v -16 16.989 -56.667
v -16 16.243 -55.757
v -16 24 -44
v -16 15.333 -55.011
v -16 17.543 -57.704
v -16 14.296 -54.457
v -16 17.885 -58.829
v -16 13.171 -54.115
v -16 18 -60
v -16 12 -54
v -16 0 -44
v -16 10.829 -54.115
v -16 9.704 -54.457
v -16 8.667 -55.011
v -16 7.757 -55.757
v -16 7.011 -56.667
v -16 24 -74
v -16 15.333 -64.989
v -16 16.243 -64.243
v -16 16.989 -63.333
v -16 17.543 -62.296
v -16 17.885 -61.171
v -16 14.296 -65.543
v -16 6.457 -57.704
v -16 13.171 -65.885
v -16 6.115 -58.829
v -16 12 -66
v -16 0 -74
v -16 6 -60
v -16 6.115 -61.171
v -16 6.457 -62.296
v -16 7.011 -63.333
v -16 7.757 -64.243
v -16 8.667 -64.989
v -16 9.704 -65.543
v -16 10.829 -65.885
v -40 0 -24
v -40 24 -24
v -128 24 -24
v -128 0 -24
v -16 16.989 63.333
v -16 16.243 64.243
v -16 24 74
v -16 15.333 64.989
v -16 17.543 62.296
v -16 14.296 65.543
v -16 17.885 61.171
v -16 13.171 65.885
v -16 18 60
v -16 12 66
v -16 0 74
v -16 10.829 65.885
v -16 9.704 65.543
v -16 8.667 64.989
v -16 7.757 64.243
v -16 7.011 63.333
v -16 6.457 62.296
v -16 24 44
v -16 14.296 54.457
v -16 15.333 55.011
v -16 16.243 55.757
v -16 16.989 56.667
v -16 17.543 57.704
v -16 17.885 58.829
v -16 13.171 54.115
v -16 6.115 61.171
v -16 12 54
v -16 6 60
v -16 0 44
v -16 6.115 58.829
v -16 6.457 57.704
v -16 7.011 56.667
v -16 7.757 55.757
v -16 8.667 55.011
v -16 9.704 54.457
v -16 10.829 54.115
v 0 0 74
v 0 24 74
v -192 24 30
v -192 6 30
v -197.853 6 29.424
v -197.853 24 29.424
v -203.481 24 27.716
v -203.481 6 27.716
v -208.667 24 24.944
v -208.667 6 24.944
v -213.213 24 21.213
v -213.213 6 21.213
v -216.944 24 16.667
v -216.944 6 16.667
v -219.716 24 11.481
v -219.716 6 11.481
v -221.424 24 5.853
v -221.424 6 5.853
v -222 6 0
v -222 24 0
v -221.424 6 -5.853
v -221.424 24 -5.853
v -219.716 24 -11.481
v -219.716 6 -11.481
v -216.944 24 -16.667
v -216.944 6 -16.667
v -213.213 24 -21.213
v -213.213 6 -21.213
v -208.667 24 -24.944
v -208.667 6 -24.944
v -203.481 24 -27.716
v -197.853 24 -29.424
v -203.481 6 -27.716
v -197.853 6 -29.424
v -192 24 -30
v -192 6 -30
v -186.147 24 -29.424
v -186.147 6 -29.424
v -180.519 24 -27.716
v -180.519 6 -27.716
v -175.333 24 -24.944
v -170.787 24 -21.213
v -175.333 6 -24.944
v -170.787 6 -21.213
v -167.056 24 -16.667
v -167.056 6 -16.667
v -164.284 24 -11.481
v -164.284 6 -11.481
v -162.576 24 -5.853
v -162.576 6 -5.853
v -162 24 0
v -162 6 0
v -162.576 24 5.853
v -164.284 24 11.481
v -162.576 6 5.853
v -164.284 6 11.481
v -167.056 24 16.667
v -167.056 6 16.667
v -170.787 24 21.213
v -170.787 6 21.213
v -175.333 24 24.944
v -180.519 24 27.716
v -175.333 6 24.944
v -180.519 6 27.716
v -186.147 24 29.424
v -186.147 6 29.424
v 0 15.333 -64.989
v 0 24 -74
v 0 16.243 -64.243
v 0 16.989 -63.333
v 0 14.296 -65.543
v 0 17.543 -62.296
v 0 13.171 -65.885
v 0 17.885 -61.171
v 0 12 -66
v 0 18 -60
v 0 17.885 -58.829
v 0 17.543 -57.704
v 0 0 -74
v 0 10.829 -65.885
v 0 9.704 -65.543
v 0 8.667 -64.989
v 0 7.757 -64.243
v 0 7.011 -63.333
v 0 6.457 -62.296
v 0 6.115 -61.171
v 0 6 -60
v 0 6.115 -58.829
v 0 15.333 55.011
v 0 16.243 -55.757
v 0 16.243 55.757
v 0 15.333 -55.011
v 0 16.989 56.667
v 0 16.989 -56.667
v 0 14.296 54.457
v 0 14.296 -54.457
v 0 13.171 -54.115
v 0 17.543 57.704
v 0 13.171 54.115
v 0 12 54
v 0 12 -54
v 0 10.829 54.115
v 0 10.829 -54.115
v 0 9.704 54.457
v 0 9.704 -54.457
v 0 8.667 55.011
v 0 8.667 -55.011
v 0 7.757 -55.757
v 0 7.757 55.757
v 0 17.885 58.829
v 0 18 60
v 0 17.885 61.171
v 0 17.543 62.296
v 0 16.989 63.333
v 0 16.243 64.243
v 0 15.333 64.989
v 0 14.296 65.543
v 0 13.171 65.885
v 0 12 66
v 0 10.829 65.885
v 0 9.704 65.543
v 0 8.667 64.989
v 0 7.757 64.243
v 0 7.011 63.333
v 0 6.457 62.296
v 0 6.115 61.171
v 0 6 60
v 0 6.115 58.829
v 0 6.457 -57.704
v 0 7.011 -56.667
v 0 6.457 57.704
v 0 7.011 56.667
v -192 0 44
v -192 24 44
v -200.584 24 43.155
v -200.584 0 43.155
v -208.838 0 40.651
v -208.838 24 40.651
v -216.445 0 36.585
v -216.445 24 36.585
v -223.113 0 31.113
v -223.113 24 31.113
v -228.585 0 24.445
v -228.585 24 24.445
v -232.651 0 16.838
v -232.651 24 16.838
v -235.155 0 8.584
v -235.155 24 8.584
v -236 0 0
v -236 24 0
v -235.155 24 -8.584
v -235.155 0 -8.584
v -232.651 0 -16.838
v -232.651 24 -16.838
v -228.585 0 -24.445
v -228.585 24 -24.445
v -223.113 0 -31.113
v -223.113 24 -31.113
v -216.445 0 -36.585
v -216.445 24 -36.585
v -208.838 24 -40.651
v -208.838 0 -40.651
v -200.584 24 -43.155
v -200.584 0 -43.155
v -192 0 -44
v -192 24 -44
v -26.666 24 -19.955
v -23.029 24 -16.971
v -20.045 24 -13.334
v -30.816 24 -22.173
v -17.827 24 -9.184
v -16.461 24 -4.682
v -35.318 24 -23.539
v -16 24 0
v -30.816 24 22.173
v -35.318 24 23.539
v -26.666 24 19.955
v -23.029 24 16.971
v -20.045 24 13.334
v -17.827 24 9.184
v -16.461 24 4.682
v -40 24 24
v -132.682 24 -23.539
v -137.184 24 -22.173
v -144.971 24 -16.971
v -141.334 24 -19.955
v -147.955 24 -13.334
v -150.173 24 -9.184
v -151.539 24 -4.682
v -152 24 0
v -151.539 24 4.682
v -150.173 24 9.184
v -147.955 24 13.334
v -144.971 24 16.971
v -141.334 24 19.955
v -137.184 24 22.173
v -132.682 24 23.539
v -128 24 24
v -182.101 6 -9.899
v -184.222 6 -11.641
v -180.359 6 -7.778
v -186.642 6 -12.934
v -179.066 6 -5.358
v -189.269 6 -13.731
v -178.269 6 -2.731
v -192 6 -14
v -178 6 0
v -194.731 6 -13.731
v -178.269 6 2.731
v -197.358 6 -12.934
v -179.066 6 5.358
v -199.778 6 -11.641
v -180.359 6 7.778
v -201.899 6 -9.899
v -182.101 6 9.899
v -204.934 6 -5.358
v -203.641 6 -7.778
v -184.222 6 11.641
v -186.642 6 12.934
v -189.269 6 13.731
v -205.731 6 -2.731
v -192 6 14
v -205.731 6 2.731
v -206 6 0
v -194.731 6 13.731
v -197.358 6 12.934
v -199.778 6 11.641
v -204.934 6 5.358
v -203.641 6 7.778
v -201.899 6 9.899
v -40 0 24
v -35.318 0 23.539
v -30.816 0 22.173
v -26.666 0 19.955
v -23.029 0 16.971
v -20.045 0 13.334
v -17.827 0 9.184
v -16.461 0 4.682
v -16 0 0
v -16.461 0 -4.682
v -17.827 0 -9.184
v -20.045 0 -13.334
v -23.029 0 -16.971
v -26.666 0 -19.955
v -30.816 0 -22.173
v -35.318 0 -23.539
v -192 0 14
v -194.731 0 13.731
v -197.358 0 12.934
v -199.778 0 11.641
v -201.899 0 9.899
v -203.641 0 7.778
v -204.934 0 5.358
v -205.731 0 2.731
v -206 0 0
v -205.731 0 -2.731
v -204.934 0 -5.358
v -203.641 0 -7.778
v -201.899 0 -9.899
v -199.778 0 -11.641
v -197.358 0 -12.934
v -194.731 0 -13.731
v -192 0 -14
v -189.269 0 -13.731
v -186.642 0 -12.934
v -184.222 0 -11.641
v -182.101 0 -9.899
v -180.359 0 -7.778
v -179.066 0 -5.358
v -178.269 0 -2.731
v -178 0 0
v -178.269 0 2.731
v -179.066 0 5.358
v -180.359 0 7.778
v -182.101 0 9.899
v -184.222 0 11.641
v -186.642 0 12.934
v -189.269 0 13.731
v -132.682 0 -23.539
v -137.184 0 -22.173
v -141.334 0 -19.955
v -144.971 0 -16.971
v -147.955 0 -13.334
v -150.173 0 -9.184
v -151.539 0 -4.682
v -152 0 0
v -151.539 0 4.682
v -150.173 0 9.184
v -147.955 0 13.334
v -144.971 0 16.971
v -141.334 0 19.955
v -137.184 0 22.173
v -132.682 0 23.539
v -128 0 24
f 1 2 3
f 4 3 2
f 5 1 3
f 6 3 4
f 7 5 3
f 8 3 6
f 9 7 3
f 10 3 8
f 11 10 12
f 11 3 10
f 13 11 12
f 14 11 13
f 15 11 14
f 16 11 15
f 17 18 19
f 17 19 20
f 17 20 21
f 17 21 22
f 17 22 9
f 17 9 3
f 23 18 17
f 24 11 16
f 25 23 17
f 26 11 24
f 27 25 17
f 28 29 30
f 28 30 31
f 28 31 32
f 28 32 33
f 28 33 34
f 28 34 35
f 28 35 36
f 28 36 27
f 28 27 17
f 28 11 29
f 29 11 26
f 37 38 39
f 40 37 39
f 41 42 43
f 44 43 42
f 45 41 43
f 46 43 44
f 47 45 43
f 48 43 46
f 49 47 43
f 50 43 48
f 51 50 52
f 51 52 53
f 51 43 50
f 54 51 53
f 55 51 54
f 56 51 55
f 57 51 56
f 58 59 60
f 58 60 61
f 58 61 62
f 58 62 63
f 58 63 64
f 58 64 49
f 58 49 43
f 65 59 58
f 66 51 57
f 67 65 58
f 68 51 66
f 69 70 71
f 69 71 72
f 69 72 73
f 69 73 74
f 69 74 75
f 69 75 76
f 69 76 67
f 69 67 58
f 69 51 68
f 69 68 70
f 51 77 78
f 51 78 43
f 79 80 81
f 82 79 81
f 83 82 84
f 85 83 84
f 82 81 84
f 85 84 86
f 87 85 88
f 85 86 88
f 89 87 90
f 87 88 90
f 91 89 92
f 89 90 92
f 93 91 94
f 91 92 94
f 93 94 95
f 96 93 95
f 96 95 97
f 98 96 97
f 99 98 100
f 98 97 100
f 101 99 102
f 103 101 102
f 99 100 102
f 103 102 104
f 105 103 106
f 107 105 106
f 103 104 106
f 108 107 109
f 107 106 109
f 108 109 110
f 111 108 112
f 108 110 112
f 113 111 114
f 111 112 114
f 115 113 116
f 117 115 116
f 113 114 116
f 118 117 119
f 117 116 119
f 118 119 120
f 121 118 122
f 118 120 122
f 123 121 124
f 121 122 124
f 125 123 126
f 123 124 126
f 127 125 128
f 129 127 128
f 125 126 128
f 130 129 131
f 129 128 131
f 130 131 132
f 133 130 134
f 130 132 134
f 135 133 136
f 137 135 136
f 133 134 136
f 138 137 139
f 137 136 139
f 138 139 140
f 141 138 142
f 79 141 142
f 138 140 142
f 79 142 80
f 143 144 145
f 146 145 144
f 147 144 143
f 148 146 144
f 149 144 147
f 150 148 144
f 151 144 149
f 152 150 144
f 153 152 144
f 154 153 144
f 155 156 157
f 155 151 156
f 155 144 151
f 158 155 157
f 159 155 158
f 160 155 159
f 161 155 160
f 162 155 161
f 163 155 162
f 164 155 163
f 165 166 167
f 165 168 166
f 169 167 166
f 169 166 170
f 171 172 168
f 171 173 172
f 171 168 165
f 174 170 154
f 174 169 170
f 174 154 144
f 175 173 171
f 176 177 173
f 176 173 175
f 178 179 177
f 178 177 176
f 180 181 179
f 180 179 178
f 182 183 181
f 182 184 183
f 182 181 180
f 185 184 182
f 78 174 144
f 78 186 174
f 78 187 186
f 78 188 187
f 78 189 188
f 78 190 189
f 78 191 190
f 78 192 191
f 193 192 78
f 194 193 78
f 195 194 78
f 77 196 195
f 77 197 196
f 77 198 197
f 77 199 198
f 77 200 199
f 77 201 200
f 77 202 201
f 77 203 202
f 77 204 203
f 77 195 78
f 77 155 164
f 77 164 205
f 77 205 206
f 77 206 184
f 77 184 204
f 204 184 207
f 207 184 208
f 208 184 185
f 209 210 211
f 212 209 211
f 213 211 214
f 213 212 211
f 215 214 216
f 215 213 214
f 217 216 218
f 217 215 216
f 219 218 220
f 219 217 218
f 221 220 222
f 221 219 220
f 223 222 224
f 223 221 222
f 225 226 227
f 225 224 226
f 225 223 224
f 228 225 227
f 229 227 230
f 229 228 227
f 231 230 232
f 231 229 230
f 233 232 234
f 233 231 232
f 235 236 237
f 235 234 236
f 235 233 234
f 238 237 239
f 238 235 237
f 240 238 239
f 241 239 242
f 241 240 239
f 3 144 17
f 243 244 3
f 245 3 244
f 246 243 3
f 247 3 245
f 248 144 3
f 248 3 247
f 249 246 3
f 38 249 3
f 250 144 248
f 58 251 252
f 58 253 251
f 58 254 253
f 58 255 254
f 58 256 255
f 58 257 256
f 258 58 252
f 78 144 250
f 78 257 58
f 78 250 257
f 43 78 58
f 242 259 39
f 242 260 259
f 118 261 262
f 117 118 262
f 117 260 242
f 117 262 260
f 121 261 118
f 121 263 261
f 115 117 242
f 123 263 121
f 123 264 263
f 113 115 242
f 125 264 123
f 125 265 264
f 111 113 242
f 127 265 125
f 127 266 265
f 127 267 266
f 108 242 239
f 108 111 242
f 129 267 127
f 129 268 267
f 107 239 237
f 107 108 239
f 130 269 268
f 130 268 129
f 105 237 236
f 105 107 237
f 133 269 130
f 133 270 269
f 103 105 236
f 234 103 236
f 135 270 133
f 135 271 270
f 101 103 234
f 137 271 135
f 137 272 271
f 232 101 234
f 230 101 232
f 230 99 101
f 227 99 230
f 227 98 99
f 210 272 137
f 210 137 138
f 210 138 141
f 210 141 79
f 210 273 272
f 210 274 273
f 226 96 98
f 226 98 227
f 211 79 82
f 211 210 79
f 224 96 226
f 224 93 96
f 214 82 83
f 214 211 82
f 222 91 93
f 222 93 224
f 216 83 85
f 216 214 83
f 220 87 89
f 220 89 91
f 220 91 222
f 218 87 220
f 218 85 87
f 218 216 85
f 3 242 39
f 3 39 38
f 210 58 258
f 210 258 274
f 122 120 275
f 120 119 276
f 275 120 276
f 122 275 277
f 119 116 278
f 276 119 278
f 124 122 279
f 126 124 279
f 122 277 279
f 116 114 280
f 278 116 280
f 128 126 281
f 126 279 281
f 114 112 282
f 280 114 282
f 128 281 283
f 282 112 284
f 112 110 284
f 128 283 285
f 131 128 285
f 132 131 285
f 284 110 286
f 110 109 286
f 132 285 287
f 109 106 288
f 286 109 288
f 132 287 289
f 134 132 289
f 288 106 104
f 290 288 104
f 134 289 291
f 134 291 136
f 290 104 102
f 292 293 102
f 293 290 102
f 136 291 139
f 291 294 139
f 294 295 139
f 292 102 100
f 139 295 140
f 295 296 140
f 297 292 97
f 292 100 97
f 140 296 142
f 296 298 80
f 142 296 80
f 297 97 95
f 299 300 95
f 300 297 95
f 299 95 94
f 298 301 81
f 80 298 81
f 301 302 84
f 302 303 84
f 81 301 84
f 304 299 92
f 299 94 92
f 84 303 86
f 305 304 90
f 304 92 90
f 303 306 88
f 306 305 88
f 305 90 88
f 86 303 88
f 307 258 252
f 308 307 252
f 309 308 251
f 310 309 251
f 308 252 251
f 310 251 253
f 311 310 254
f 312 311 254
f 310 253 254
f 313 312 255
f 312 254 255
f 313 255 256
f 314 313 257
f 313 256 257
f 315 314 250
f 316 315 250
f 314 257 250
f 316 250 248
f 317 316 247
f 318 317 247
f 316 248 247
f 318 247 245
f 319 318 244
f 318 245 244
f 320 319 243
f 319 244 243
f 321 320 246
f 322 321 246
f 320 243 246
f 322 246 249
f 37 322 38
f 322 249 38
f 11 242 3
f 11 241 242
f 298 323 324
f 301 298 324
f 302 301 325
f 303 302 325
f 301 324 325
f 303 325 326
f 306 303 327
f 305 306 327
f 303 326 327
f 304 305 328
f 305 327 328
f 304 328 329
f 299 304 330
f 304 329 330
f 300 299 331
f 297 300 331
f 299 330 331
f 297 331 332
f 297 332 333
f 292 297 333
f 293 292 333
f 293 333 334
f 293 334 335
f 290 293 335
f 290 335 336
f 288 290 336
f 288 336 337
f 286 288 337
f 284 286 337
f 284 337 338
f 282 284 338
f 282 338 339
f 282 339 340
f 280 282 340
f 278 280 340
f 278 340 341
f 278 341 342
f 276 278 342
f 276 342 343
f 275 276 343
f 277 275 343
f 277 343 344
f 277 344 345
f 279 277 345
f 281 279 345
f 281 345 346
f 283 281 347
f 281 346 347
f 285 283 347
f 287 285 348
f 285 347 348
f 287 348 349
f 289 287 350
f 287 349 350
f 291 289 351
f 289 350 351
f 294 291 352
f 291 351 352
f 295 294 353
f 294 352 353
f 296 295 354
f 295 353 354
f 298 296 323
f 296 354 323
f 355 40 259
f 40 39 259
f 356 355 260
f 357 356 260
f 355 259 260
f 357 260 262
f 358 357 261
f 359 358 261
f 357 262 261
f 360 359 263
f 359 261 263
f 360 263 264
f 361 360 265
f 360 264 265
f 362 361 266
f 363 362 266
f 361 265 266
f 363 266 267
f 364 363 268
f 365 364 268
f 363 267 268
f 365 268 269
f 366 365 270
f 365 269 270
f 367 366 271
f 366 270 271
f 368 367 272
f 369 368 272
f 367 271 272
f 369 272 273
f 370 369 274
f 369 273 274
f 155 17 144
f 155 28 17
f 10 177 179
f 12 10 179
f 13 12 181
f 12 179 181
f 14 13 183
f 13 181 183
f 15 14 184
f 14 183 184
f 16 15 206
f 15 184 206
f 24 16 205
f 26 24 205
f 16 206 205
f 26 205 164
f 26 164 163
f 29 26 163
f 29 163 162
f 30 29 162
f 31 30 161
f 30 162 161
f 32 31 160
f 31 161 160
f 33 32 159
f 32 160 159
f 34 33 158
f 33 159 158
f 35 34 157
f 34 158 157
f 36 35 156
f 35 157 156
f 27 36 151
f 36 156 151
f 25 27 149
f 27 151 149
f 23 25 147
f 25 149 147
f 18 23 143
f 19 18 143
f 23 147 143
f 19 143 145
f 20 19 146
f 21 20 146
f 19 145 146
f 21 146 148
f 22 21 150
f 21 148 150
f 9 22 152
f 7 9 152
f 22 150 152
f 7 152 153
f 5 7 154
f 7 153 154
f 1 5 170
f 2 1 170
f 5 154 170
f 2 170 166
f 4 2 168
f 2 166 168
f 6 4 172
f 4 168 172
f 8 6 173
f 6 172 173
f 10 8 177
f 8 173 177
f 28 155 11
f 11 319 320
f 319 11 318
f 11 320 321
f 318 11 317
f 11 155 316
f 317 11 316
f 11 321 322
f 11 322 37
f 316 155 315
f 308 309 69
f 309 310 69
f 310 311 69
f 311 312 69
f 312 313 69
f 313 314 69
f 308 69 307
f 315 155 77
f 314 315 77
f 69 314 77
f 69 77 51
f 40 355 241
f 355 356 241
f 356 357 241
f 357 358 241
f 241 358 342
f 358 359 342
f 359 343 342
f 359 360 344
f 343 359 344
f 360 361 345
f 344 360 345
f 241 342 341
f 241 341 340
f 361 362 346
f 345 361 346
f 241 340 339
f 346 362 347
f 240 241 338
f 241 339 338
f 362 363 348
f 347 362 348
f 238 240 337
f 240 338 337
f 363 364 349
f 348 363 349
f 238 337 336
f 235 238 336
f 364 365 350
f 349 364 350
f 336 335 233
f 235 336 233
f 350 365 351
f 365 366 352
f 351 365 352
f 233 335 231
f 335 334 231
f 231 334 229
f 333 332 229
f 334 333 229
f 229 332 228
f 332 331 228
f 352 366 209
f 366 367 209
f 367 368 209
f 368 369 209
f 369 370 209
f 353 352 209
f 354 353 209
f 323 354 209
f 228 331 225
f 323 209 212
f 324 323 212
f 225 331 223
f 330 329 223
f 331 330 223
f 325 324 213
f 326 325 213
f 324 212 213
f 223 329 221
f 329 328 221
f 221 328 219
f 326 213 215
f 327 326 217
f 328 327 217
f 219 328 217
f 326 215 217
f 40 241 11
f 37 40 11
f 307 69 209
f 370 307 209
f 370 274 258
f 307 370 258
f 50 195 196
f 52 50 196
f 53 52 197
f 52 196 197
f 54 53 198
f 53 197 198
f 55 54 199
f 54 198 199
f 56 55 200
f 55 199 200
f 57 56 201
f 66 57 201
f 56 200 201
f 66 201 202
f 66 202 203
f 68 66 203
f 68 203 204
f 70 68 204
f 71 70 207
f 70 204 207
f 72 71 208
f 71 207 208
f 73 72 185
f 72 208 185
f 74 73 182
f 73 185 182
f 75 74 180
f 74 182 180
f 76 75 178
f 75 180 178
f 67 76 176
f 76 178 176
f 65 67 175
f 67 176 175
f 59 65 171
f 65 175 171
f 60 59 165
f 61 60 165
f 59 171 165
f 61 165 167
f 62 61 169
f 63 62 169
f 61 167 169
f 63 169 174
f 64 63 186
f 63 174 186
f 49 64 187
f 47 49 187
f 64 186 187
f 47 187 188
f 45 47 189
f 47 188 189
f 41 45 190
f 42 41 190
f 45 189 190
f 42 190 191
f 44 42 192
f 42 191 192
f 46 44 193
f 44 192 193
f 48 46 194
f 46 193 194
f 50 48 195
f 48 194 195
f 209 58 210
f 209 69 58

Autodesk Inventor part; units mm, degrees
ref_plane "YZ Plane" through (0, 0, 0) normal (1, 0, 0) x (0, 1, 0)
ref_plane "XZ Plane" through (0, 0, 0) normal (0, 1, 0) x (-1, 0, 0)
ref_plane "XY Plane" through (0, 0, 0) normal (0, 0, 1) x (1, 0, 0)
sketch "Skizze1" plane through (0, 0, 0) normal (0, 1, 0) x (-1, 0, 0)
  line L0 (0, 0) -> (0, 74)
  line L1 (0, 74) -> (16, 74)
  line L2 (16, 74) -> (16, 44)
  line L3 (16, 44) -> (192, 44)
  arc A0 (192, -44) -> (192, 44) centre (192, 0) ccw
  line L4 (192, -44) -> (16, -44)
  line L5 (16, -44) -> (16, -74)
  line L6 (16, -74) -> (0, -74)
  line L7 (0, -74) -> (0, 0)
  line L8 (0, 0) -> (236, 0) construction
  dimension "d0" = 192
  dimension "d1" = 16
  dimension "d2" = 30
  dimension "d3" = 44
extrude "Extrusion1" add sketch "Skizze1" along normal blind 24
sketch "Skizze2" plane through (0, 24, 0) normal (0, 1, 0) x (1, 0, 0)
  arc A0 (-192, 44) -> (-192, -44) centre (-192, 0) ccw projected
  point P0 (0, 0)
hole "Bohrung1" at (-192, 24, 0) direction (0, -1, 0) diameter 60 depth 18
sketch "Skizze3" plane through (-192, 6, 0) normal (0, 1, 0) x (1, 0, 0)
  circle A0 centre (0, 0) radius 30 projected
  point P0 (192, 0)
hole "Bohrung2" at (-192, 6, 0) direction (0, -1, 0) diameter 28 depth 6
sketch "Skizze4" plane through (0, 24, 0) normal (0, 1, 0) x (1, 0, 0)
  line L0 (-40, 0) -> (-128, 0) construction
  line L1 (-40, 24) -> (-128, 24)
  line L2 (-128, -24) -> (-40, -24)
  arc A0 (-40, -24) -> (-40, 24) centre (-40, 0) ccw
  arc A1 (-128, 24) -> (-128, -24) centre (-128, 0) ccw
  line L3 (0, -74) -> (0, 74) projected
  line L4 (-16, -44) -> (-16, -74) projected
  point P0 (0, 0)
  point P1 (-84, 0)
  point P2 (0, 0)
  point P3 (0, 0)
  dimension "d20" = 88
  dimension "d21" = 48
  dimension "d22" = 24
extrude "Extrusion2" cut sketch "Skizze4" against normal up to surface (24 mm away)
sketch "Skizze5" plane through (-16, 0, -74) normal (-1, 0, 0) x (0, 0, 1)
  line L0 (148, 0) -> (148, 24) projected
  line L1 (0, 0) -> (0, 24) projected
  point P0 (74, 0)
  point P1 (14, 12)
  point P2 (134, 12)
  point P3 (148, 12)
  point P4 (0, 12)
  dimension "d32" = 120
  dimension "d33" = 60
hole "Bohrung3" at (-16, 12, -60) at (-16, 12, 60) direction (1, 0, 0) diameter 12 depth 16
properties part number "1" material "Messing, weicher Gelbton"
